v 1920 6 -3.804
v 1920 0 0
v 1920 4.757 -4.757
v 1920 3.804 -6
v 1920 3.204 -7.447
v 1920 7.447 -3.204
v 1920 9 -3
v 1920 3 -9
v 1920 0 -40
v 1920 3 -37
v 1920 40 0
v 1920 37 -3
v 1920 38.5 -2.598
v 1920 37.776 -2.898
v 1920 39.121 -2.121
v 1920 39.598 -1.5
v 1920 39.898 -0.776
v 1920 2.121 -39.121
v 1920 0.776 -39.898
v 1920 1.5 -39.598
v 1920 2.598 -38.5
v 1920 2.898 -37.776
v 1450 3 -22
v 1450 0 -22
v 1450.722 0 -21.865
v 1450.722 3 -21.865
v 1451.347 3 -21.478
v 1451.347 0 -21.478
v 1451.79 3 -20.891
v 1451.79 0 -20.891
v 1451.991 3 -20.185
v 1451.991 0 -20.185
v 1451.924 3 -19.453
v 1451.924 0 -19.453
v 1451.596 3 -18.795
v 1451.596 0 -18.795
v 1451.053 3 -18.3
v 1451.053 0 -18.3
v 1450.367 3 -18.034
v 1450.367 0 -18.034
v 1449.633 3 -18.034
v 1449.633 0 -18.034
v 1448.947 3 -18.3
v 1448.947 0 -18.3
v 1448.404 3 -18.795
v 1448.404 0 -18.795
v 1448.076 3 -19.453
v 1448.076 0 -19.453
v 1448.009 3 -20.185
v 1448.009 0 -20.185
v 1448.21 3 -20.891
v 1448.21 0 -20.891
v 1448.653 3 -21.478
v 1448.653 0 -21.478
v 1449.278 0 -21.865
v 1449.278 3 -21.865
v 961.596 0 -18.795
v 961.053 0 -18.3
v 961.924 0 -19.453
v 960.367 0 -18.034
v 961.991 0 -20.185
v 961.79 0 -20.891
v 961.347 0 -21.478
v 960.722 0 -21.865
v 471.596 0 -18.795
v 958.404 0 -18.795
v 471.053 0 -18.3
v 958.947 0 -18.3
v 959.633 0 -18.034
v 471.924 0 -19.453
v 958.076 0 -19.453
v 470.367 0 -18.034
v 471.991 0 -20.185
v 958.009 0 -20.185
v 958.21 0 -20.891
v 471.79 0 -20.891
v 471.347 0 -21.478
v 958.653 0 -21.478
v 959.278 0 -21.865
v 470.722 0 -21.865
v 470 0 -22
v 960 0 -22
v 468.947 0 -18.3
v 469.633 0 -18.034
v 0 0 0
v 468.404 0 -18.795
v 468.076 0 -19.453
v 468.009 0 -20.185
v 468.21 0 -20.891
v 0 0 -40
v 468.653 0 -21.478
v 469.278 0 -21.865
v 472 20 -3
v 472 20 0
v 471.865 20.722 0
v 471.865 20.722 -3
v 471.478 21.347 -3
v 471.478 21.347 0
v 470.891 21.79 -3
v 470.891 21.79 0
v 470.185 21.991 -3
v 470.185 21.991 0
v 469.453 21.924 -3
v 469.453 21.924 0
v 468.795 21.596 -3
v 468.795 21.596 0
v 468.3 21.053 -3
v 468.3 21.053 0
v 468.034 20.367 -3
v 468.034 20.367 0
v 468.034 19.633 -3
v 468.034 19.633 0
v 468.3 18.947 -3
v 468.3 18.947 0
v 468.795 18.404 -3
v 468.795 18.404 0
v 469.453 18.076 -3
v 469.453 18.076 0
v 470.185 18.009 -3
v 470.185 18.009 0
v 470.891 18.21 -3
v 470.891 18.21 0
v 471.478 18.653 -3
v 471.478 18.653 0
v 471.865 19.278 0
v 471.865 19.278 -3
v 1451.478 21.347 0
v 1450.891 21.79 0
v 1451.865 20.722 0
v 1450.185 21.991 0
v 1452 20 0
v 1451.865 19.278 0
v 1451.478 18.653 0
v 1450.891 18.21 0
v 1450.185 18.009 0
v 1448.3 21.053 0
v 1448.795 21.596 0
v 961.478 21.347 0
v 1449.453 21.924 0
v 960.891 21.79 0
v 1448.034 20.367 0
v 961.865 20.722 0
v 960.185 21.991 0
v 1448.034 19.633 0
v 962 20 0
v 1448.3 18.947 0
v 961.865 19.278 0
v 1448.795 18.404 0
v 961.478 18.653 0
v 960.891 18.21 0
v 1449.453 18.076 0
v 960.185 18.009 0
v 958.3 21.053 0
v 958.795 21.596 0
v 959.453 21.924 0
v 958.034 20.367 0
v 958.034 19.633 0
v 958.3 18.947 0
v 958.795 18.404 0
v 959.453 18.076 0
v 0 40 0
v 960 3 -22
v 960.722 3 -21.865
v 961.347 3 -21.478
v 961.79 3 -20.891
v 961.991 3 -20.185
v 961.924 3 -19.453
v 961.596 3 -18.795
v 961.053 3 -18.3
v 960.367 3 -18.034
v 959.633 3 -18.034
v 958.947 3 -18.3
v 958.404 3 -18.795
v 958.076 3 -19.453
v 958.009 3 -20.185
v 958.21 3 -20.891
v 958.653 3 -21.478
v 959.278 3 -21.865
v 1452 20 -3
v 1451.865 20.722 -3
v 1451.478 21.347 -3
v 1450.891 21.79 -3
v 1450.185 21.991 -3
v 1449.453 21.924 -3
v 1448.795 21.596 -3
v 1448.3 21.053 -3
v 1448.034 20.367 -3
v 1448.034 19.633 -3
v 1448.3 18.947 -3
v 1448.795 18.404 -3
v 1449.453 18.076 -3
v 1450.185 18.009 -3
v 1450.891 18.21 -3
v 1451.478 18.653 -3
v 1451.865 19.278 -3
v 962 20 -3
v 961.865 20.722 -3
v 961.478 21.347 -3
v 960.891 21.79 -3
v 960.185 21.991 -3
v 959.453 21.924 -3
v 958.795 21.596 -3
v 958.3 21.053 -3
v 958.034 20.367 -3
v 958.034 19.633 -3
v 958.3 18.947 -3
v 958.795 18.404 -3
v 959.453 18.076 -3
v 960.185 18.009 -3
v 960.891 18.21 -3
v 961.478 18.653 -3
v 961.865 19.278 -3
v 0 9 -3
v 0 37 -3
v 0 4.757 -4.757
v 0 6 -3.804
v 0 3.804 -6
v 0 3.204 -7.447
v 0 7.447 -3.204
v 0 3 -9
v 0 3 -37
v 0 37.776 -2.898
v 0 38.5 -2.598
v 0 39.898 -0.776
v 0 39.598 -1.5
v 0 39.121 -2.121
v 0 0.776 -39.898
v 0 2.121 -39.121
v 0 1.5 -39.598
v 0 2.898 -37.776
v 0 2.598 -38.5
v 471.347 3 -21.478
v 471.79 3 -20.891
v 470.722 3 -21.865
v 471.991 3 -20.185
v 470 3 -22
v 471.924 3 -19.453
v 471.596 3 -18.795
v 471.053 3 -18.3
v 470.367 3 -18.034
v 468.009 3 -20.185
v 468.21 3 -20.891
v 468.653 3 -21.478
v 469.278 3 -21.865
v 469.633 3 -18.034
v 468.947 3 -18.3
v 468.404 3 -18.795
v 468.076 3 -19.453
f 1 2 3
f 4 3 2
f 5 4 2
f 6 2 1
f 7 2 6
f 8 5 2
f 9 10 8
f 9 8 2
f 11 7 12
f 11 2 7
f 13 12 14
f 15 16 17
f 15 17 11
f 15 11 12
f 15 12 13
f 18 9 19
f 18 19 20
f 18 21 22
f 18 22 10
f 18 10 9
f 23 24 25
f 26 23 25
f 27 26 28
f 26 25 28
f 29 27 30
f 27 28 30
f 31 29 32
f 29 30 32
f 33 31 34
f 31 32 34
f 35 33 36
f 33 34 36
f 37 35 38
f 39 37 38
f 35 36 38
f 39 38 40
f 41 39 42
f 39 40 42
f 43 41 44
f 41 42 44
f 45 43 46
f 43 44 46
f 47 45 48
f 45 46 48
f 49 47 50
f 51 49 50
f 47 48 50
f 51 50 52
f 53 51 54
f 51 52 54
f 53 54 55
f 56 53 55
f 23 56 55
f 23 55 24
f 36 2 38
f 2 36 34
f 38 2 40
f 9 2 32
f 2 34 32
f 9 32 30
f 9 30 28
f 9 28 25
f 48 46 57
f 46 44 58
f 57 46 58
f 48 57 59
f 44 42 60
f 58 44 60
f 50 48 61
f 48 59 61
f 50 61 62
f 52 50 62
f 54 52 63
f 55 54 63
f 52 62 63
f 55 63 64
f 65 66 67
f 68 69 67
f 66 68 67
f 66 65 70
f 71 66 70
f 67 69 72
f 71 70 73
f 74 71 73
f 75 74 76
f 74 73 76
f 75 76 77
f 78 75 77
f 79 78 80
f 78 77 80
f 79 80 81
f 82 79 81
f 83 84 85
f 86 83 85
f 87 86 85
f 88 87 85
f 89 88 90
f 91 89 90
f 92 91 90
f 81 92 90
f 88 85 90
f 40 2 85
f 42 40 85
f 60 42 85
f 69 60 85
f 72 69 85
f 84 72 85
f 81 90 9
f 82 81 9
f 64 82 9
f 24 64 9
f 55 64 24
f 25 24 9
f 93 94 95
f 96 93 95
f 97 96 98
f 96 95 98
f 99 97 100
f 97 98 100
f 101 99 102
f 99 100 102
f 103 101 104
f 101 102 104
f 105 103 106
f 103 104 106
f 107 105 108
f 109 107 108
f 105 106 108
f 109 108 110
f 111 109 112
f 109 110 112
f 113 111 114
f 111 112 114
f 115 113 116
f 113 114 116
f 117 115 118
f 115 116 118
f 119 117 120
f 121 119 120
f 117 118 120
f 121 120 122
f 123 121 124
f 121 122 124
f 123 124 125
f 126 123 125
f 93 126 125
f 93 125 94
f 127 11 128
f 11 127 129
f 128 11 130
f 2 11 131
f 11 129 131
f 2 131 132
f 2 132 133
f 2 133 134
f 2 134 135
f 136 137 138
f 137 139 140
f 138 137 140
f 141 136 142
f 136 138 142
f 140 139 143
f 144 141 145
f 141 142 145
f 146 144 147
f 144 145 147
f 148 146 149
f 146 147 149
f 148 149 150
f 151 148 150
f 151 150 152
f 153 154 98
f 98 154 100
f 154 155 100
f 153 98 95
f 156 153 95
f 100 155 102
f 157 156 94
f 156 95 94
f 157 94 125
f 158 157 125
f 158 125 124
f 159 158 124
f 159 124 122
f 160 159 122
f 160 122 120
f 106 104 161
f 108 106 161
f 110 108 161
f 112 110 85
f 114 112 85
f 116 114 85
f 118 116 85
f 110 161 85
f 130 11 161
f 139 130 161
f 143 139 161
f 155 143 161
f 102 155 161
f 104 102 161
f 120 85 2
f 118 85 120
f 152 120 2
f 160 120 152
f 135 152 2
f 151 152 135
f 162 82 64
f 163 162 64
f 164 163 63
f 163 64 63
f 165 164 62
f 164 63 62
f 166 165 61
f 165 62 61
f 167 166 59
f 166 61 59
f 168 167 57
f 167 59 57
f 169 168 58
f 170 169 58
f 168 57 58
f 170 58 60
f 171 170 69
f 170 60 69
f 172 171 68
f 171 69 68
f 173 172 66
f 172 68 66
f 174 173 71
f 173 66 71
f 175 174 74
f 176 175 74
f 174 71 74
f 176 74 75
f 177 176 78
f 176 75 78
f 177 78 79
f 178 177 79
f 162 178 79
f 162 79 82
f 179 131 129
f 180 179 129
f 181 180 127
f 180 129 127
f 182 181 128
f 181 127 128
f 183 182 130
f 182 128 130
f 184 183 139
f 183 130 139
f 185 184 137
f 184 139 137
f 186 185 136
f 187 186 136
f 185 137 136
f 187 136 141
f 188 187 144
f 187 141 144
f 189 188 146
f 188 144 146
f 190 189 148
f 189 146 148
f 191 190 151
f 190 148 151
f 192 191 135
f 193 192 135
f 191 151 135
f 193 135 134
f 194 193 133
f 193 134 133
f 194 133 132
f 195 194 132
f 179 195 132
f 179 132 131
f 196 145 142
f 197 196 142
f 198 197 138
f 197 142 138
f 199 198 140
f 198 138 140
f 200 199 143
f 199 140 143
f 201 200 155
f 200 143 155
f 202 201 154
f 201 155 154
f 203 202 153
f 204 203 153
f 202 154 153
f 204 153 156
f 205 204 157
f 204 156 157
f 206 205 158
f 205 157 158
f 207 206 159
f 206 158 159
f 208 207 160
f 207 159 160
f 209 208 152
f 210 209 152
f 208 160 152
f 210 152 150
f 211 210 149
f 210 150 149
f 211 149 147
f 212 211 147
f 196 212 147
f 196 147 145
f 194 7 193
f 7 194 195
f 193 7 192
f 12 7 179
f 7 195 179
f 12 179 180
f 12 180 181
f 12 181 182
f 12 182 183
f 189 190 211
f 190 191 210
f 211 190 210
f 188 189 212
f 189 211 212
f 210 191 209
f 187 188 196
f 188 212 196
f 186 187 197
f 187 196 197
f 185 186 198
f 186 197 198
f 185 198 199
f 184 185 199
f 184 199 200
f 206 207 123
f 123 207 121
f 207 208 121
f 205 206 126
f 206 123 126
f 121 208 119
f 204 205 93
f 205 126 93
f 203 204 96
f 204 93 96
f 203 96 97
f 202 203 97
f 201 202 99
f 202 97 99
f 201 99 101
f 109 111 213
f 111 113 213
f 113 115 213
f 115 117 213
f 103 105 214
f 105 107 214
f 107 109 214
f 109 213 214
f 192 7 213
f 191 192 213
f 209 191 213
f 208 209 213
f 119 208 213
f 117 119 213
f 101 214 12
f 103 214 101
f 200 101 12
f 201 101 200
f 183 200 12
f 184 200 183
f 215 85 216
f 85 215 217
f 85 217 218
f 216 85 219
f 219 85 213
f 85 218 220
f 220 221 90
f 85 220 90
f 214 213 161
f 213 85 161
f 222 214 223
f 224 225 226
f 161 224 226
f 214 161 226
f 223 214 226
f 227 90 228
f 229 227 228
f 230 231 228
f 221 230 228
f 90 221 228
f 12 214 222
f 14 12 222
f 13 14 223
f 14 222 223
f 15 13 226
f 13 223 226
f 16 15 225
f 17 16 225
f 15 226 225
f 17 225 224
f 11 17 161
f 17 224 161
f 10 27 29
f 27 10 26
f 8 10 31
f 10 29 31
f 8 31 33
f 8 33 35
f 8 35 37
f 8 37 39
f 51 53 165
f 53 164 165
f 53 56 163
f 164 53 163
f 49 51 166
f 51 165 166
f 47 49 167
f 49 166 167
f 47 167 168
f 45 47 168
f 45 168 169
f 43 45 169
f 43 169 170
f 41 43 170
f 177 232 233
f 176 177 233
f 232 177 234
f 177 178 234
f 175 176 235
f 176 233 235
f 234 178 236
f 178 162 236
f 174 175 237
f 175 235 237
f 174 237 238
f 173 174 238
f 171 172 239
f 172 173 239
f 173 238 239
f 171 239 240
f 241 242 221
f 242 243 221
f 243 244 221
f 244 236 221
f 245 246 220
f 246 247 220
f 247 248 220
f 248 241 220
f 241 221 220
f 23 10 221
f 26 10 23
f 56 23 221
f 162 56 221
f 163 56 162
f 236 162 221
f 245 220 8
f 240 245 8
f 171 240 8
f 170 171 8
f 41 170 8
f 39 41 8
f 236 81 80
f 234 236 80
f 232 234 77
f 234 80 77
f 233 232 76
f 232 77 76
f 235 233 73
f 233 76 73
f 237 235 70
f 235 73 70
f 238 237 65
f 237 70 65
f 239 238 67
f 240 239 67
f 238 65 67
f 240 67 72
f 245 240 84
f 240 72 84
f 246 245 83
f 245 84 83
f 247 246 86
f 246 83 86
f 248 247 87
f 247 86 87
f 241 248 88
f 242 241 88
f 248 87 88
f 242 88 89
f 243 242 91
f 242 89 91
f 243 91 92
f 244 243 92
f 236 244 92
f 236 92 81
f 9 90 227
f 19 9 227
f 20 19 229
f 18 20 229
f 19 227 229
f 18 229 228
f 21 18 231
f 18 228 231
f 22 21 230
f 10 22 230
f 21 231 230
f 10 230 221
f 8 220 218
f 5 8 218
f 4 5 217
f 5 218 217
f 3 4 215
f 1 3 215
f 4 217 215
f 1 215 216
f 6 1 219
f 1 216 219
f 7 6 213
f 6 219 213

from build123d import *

# Parameters (mm, degrees)
L_ANGLE_EQUAL_40X40X3_2_DEPTH = 1920
SKETCH15_R                    = 2
CUT_EXTRUDE1_DEPTH            = 10
SKETCH16_R                    = 2
CUT_EXTRUDE2_DEPTH            = 3


with BuildPart() as part:
    # Sketch13 → L angle (equal) 40X40X3(2) (new body)
    with BuildSketch(Plane(origin=(0, 0, 0), x_dir=(0, 0, -1), z_dir=(1, 0, 0))):
        with BuildLine():
            Line((0, 40), (0, 0))
            Line((0, 0), (40, 0))
            ThreePointArc((40, 0), (39.121320344, 2.121320344), (37, 3))
            Line((37, 3), (9, 3))
            ThreePointArc((9, 3), (4.757359313, 4.757359313), (3, 9))
            Line((3, 9), (3, 37))
            ThreePointArc((3, 37), (2.121320344, 39.121320344), (0, 40))
        make_face()
    extrude(amount=L_ANGLE_EQUAL_40X40X3_2_DEPTH)

    # Sketch15 → Cut-Extrude1 (cut)
    with BuildSketch(Plane(origin=(0, 0, 0), x_dir=(-1, 0, 0), z_dir=(0, -1, 0))):
        with Locations(Location((-960, 20, 0), (0, 0, 90))):
            Circle(SKETCH15_R)
        with Locations(Location((-470, 20, 0), (0, 0, 90))):
            Circle(SKETCH15_R)
        with Locations(Location((-1450, 20, 0), (0, 0, 90))):
            Circle(SKETCH15_R)
    extrude(amount=-CUT_EXTRUDE1_DEPTH, mode=Mode.SUBTRACT)

    # Sketch16 → Cut-Extrude2 (cut)
    with BuildSketch(Plane.XY):
        with Locations((960, 20)):
            Circle(SKETCH16_R)
        with Locations((1450, 20)):
            Circle(SKETCH16_R)
        with Locations((470, 20)):
            Circle(SKETCH16_R)
    extrude(amount=-CUT_EXTRUDE2_DEPTH, mode=Mode.SUBTRACT)


solid = part.part
